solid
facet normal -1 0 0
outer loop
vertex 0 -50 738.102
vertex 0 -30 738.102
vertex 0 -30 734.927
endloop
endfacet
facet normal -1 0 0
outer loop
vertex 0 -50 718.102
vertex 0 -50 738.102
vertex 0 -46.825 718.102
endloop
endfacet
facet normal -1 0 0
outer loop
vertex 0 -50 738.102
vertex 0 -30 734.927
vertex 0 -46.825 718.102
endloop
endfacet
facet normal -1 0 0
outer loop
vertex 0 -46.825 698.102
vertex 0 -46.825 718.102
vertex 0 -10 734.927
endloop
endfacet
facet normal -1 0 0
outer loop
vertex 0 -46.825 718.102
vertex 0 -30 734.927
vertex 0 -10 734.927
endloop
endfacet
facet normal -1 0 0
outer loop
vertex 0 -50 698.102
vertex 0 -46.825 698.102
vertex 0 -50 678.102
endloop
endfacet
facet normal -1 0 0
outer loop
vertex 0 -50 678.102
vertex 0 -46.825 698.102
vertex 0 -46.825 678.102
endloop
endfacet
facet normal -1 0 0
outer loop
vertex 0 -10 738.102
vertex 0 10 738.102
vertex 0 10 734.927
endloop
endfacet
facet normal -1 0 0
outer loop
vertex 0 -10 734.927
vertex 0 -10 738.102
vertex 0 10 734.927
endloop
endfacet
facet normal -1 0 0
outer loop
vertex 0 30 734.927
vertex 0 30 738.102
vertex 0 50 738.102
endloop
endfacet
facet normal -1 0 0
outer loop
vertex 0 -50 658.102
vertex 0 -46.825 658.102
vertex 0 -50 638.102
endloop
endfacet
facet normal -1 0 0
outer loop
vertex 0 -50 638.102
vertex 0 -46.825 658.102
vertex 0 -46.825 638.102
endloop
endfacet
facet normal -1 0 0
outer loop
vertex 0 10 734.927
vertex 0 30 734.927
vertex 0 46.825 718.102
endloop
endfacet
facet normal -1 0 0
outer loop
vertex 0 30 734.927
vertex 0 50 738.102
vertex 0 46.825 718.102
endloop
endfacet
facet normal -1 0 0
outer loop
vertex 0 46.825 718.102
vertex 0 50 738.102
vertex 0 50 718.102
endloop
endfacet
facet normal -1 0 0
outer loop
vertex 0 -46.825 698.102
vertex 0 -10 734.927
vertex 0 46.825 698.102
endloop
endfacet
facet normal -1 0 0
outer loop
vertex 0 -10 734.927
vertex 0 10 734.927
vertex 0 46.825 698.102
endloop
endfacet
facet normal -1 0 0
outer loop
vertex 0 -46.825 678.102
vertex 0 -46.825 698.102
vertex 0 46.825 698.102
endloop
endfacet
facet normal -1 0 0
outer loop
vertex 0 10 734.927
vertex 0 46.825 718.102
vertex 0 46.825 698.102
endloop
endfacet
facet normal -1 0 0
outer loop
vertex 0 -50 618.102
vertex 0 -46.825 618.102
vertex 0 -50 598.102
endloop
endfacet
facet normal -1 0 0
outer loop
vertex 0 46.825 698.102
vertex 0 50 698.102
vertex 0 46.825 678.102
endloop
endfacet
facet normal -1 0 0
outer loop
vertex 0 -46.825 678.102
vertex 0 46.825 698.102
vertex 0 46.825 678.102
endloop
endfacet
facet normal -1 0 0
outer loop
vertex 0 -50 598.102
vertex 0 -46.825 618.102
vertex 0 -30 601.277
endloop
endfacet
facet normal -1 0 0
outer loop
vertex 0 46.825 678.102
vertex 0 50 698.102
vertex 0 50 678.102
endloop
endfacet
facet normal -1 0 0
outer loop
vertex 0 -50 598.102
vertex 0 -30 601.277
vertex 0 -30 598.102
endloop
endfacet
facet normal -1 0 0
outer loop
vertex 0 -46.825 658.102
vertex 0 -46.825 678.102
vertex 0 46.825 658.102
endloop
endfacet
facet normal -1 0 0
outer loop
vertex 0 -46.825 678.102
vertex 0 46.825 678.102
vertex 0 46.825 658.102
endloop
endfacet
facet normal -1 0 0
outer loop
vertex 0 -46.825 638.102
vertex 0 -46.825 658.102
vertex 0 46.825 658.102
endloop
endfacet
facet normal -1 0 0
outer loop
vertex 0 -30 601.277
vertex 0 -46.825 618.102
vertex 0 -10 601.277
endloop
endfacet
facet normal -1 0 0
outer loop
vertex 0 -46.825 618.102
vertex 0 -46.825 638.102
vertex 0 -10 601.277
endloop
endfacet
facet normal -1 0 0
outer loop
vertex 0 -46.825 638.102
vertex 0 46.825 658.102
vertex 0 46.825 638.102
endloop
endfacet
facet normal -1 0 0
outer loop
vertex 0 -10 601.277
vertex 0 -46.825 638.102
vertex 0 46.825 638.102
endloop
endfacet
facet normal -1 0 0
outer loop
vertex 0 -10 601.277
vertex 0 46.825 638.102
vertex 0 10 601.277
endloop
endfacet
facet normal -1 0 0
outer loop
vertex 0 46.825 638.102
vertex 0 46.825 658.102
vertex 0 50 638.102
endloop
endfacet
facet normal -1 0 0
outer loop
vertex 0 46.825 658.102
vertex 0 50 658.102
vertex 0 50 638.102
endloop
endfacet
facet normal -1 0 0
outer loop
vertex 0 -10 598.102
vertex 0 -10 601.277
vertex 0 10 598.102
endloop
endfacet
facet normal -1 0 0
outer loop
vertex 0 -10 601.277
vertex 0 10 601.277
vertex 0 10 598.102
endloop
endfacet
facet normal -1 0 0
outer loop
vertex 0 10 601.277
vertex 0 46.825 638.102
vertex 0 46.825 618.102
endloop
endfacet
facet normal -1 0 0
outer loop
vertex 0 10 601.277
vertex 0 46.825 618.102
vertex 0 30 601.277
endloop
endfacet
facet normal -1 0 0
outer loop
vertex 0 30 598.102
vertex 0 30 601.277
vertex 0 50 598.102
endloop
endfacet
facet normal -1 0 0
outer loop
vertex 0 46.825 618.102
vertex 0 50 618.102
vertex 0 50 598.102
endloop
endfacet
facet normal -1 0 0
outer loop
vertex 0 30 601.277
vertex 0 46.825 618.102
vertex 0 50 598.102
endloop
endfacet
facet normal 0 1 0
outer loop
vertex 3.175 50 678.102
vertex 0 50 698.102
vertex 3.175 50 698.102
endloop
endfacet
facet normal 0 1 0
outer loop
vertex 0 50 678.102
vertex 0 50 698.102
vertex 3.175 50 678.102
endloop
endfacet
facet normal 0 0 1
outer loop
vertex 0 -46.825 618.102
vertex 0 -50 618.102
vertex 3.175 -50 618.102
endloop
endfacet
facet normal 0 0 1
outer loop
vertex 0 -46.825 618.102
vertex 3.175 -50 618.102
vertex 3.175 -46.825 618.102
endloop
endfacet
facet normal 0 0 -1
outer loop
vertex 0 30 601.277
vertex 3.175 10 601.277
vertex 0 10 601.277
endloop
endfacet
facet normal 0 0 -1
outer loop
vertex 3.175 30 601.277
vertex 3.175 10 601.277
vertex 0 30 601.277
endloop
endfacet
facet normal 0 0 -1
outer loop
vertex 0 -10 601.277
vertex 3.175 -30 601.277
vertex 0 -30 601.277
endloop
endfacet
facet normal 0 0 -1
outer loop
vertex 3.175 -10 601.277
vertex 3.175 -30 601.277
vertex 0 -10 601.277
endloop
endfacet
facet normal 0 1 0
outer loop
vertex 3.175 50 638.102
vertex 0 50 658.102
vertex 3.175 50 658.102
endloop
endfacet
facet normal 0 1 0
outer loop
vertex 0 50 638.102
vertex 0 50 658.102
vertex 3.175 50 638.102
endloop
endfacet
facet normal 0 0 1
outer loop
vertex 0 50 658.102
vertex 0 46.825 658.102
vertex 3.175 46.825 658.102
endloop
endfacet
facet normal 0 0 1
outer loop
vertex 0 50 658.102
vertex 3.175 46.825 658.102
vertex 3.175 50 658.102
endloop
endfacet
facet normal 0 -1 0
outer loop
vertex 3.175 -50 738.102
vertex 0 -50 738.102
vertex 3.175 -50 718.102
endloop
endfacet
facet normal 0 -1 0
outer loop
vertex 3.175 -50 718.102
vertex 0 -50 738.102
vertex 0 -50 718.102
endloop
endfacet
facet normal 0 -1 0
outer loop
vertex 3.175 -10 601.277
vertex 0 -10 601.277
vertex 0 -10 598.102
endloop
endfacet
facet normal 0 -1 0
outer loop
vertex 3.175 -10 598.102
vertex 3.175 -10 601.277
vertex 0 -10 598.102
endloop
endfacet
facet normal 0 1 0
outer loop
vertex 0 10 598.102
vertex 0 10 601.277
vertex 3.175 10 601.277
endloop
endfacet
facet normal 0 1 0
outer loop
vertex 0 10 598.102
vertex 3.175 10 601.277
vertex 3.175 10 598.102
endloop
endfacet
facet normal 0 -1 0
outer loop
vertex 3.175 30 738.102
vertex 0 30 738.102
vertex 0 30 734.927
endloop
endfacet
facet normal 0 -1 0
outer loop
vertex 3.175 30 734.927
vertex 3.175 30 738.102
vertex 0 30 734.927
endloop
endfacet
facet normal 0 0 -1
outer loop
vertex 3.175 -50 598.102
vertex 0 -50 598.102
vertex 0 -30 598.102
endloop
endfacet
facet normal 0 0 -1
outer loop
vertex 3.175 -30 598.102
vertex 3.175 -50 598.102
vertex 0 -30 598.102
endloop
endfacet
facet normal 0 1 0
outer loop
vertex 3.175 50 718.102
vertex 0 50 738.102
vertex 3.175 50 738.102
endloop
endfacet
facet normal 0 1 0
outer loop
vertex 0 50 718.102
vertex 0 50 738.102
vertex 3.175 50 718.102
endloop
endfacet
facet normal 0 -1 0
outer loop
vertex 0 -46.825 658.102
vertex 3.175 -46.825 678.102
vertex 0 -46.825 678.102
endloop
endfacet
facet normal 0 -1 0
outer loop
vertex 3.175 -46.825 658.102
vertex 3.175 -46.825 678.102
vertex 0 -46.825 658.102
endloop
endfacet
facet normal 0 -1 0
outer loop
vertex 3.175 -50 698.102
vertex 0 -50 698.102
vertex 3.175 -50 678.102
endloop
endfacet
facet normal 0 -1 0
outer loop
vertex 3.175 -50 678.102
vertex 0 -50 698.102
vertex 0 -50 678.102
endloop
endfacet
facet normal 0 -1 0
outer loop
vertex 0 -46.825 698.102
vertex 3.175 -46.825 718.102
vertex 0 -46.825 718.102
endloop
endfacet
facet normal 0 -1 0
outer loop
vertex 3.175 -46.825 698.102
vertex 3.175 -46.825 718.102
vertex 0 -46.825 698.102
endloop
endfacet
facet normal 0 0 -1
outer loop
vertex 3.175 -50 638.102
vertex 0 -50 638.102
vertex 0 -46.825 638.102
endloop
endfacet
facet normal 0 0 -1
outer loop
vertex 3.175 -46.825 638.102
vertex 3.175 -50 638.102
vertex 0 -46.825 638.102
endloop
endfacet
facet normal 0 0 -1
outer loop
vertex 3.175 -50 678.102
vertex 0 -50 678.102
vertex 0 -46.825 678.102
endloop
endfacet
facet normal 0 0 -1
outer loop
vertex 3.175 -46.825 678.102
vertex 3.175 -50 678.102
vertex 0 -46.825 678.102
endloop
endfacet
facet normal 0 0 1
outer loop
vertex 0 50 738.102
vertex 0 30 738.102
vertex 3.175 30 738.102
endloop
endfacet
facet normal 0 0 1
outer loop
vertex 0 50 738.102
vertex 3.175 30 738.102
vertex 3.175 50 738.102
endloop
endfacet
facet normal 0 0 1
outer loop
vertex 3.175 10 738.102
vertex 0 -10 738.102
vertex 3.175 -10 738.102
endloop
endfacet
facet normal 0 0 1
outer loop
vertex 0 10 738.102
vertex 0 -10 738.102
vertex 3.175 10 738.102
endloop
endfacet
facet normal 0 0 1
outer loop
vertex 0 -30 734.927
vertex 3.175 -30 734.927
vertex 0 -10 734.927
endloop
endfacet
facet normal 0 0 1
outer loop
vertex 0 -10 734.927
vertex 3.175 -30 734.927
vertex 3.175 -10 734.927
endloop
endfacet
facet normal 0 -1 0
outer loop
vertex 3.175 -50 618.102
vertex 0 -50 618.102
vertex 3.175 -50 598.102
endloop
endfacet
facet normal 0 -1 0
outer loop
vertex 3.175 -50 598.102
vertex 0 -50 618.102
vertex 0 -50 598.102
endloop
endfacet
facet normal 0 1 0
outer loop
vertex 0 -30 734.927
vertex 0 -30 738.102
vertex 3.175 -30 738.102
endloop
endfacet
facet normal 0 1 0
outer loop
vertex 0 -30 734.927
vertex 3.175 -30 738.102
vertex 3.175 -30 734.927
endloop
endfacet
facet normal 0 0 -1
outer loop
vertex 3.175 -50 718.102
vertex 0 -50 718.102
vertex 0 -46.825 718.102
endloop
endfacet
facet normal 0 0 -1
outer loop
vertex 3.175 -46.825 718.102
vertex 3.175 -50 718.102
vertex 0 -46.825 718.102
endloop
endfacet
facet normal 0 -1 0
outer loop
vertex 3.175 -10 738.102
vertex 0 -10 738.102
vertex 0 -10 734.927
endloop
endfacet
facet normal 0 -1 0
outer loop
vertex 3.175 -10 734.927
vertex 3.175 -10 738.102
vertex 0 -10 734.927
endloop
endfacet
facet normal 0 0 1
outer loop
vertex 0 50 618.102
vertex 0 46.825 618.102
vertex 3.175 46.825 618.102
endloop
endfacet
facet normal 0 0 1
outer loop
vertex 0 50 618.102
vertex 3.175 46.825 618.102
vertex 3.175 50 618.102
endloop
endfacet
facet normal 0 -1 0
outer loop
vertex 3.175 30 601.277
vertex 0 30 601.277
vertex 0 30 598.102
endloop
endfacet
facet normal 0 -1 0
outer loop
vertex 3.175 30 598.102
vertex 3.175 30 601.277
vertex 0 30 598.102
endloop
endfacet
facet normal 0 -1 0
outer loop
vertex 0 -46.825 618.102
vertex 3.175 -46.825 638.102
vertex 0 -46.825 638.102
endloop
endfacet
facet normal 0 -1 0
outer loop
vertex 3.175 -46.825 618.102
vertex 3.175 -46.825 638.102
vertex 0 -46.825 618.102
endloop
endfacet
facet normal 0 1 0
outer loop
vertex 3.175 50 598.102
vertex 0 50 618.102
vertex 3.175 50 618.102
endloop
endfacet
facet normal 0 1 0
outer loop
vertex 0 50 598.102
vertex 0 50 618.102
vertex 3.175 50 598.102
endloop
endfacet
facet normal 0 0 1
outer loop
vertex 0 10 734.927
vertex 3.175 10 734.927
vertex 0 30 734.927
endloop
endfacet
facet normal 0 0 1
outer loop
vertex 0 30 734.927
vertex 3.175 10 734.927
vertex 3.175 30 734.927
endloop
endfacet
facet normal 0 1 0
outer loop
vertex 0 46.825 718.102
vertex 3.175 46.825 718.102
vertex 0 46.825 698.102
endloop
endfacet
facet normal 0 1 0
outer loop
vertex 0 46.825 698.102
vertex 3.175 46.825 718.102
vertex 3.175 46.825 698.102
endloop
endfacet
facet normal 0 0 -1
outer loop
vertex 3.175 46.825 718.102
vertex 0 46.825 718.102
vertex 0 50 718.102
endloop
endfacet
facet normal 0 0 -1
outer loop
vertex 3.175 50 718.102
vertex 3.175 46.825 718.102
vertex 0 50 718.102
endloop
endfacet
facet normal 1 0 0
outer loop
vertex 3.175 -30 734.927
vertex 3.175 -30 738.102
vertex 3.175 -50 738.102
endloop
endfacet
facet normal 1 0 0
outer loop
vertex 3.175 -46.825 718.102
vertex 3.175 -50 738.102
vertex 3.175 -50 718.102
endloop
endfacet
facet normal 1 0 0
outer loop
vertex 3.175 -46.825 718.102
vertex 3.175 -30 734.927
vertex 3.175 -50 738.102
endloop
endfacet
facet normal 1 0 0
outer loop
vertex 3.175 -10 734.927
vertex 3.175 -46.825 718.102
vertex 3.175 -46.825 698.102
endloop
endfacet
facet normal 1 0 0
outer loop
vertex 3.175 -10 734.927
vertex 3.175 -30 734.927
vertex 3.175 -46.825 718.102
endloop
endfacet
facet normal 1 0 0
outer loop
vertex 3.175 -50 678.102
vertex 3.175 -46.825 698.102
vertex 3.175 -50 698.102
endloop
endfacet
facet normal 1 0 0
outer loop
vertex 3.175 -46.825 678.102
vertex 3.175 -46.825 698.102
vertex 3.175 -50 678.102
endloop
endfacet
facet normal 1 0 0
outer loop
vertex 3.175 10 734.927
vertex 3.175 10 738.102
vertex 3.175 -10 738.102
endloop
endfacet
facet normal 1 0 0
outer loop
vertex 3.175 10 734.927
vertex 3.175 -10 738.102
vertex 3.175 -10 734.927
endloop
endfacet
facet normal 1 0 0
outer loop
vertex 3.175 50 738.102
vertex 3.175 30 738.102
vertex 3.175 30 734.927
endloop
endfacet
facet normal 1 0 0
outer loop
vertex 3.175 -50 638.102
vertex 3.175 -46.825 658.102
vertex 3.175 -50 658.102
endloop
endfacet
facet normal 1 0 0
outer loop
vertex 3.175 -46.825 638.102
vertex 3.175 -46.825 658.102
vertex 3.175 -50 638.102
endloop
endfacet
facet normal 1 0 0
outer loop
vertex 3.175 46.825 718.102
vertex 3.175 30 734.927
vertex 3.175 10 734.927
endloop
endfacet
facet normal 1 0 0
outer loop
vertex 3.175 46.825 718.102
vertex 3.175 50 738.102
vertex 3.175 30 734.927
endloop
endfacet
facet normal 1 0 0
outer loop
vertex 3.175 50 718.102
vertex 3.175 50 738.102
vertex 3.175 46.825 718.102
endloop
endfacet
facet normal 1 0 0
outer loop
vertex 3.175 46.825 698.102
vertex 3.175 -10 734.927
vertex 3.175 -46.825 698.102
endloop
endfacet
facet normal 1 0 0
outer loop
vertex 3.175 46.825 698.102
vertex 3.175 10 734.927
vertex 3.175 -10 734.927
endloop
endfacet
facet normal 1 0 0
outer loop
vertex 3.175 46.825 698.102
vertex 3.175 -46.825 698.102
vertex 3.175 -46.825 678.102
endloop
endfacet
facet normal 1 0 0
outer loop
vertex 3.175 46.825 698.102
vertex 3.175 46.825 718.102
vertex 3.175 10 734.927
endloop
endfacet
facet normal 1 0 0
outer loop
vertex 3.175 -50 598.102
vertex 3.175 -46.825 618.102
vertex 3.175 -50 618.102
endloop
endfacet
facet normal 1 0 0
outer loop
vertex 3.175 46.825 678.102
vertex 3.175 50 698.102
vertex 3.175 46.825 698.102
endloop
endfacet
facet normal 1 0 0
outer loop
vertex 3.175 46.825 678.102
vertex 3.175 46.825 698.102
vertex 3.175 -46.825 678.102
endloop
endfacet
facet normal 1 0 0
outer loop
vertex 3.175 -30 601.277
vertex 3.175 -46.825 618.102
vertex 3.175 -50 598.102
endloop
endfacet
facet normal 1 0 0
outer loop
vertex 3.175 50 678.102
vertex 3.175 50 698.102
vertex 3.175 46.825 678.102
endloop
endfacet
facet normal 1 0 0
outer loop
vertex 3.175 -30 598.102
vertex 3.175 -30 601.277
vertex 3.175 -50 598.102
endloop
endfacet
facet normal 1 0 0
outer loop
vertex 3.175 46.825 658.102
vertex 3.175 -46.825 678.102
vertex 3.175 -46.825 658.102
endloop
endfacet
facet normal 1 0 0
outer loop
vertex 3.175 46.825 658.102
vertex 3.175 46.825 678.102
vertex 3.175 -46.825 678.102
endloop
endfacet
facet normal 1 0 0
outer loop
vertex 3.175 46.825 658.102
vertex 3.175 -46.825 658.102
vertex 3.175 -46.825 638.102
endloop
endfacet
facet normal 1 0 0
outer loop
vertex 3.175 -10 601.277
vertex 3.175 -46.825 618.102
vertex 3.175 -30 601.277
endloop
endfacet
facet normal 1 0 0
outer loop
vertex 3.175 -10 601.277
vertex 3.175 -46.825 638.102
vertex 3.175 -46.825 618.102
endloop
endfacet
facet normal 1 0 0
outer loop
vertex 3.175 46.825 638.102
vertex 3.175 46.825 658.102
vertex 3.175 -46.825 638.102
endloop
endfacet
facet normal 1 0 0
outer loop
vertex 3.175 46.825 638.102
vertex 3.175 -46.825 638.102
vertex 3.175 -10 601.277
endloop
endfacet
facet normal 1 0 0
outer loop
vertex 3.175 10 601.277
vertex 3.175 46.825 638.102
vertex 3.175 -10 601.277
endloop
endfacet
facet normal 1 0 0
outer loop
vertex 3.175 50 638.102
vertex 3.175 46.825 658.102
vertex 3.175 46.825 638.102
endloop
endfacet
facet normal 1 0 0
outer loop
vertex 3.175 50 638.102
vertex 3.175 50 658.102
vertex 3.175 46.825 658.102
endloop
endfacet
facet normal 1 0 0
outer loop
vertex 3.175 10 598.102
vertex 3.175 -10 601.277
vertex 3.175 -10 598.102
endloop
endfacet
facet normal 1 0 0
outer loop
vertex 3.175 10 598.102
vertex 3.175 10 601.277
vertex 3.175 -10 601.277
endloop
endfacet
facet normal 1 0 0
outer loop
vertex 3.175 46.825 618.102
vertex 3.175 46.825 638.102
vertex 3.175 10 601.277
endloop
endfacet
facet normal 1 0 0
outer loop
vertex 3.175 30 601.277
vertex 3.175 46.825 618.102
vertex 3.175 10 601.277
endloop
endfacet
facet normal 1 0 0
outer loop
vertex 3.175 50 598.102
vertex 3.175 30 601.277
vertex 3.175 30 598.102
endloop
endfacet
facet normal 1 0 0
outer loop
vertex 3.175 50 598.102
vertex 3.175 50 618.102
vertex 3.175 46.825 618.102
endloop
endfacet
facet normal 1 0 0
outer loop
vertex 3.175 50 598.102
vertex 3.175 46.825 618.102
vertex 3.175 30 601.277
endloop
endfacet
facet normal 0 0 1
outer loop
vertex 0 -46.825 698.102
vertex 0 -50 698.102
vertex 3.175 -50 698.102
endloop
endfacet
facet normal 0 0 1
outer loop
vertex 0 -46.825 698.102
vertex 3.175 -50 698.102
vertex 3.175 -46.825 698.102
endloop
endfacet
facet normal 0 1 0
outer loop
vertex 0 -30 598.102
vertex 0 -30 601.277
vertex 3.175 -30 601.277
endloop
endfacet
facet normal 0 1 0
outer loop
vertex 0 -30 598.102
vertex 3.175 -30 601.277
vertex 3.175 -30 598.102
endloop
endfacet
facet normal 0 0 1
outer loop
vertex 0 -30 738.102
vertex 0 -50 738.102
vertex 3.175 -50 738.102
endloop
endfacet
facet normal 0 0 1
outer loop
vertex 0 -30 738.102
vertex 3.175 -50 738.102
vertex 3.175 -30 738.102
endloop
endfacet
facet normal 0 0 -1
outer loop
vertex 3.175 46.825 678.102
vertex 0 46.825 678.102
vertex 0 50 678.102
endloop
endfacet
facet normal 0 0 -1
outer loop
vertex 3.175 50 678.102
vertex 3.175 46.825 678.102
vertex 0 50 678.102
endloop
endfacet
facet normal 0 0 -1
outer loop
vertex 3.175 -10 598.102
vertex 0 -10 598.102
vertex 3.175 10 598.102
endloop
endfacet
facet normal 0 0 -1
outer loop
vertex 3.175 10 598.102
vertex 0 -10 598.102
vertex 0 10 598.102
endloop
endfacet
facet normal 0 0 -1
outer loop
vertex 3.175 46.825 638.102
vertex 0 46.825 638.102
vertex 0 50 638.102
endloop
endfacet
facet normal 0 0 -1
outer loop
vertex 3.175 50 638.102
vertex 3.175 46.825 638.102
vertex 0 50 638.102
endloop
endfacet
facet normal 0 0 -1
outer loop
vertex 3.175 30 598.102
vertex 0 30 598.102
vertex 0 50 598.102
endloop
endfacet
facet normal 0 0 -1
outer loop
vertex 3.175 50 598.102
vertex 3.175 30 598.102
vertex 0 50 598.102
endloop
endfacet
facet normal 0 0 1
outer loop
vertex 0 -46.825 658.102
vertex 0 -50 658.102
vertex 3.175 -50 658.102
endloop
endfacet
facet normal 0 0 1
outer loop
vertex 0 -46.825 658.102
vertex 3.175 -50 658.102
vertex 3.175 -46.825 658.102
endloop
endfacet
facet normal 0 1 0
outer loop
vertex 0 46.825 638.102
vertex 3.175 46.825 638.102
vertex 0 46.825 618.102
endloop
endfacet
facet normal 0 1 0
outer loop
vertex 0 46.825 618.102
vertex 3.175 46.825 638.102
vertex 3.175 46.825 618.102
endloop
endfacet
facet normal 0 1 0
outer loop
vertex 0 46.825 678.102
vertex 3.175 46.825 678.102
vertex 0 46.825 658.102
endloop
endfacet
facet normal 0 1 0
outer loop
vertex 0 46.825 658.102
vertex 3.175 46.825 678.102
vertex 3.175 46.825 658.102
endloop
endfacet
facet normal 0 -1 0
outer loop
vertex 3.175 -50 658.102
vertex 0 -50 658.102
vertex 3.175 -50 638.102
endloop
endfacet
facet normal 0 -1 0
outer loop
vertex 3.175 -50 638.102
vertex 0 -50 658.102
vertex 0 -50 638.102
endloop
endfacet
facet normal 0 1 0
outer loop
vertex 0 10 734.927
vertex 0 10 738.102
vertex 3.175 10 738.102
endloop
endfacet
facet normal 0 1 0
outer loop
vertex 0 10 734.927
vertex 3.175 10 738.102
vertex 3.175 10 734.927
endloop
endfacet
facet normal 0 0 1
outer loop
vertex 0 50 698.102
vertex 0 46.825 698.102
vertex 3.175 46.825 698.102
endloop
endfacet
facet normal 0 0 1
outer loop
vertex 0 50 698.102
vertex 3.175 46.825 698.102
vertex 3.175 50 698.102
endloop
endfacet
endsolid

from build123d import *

# Parameters (mm, degrees)
SKETCH43_W           = 140
SKETCH43_H           = 99.999981374
BOSS_EXTRUDE10_DEPTH = 3.175
SKETCH45_W           = 3.175
SKETCH45_H           = 20
SKETCH45_W_2         = 20
SKETCH45_H_2         = 3.175
CUT_EXTRUDE22_DEPTH  = 3.175


with BuildPart() as part:
    # Sketch43 → Boss-Extrude10 (new body)
    with BuildSketch(Plane(origin=(0, 0, 0), x_dir=(0, 0, -1), z_dir=(1, 0, 0))):
        with Locations((-668.101928689, 4.4643e-05)):
            Rectangle(SKETCH43_W, SKETCH43_H)
    extrude(amount=BOSS_EXTRUDE10_DEPTH)

    # Sketch45 → Cut-Extrude22 (cut)
    with BuildSketch(Plane(origin=(3.175, 0, 0), x_dir=(0, 0, -1), z_dir=(1, 0, 0))):
        with Locations((-599.689428689, 20.000053956)):
            Rectangle(SKETCH45_W, SKETCH45_H)
        with Locations((-736.514428689, 20.000053956)):
            Rectangle(SKETCH45_W, SKETCH45_H)
        with Locations((-736.514428689, -19.999946044)):
            Rectangle(SKETCH45_W, SKETCH45_H)
        with Locations((-599.689428689, -19.999946044)):
            Rectangle(SKETCH45_W, SKETCH45_H)
        with Locations((-668.101928689, -48.412446044)):
            Rectangle(SKETCH45_W_2, SKETCH45_H_2)
        with Locations((-708.101928689, -48.412446044)):
            Rectangle(SKETCH45_W_2, SKETCH45_H_2)
        with Locations((-628.101928689, -48.412446044)):
            Rectangle(SKETCH45_W_2, SKETCH45_H_2)
        with Locations((-668.101928689, 48.41253533)):
            Rectangle(SKETCH45_W_2, SKETCH45_H_2)
        with Locations((-708.101928689, 48.41253533)):
            Rectangle(SKETCH45_W_2, SKETCH45_H_2)
        with Locations((-628.101928689, 48.41253533)):
            Rectangle(SKETCH45_W_2, SKETCH45_H_2)
    extrude(amount=-CUT_EXTRUDE22_DEPTH, mode=Mode.SUBTRACT)


solid = part.part
